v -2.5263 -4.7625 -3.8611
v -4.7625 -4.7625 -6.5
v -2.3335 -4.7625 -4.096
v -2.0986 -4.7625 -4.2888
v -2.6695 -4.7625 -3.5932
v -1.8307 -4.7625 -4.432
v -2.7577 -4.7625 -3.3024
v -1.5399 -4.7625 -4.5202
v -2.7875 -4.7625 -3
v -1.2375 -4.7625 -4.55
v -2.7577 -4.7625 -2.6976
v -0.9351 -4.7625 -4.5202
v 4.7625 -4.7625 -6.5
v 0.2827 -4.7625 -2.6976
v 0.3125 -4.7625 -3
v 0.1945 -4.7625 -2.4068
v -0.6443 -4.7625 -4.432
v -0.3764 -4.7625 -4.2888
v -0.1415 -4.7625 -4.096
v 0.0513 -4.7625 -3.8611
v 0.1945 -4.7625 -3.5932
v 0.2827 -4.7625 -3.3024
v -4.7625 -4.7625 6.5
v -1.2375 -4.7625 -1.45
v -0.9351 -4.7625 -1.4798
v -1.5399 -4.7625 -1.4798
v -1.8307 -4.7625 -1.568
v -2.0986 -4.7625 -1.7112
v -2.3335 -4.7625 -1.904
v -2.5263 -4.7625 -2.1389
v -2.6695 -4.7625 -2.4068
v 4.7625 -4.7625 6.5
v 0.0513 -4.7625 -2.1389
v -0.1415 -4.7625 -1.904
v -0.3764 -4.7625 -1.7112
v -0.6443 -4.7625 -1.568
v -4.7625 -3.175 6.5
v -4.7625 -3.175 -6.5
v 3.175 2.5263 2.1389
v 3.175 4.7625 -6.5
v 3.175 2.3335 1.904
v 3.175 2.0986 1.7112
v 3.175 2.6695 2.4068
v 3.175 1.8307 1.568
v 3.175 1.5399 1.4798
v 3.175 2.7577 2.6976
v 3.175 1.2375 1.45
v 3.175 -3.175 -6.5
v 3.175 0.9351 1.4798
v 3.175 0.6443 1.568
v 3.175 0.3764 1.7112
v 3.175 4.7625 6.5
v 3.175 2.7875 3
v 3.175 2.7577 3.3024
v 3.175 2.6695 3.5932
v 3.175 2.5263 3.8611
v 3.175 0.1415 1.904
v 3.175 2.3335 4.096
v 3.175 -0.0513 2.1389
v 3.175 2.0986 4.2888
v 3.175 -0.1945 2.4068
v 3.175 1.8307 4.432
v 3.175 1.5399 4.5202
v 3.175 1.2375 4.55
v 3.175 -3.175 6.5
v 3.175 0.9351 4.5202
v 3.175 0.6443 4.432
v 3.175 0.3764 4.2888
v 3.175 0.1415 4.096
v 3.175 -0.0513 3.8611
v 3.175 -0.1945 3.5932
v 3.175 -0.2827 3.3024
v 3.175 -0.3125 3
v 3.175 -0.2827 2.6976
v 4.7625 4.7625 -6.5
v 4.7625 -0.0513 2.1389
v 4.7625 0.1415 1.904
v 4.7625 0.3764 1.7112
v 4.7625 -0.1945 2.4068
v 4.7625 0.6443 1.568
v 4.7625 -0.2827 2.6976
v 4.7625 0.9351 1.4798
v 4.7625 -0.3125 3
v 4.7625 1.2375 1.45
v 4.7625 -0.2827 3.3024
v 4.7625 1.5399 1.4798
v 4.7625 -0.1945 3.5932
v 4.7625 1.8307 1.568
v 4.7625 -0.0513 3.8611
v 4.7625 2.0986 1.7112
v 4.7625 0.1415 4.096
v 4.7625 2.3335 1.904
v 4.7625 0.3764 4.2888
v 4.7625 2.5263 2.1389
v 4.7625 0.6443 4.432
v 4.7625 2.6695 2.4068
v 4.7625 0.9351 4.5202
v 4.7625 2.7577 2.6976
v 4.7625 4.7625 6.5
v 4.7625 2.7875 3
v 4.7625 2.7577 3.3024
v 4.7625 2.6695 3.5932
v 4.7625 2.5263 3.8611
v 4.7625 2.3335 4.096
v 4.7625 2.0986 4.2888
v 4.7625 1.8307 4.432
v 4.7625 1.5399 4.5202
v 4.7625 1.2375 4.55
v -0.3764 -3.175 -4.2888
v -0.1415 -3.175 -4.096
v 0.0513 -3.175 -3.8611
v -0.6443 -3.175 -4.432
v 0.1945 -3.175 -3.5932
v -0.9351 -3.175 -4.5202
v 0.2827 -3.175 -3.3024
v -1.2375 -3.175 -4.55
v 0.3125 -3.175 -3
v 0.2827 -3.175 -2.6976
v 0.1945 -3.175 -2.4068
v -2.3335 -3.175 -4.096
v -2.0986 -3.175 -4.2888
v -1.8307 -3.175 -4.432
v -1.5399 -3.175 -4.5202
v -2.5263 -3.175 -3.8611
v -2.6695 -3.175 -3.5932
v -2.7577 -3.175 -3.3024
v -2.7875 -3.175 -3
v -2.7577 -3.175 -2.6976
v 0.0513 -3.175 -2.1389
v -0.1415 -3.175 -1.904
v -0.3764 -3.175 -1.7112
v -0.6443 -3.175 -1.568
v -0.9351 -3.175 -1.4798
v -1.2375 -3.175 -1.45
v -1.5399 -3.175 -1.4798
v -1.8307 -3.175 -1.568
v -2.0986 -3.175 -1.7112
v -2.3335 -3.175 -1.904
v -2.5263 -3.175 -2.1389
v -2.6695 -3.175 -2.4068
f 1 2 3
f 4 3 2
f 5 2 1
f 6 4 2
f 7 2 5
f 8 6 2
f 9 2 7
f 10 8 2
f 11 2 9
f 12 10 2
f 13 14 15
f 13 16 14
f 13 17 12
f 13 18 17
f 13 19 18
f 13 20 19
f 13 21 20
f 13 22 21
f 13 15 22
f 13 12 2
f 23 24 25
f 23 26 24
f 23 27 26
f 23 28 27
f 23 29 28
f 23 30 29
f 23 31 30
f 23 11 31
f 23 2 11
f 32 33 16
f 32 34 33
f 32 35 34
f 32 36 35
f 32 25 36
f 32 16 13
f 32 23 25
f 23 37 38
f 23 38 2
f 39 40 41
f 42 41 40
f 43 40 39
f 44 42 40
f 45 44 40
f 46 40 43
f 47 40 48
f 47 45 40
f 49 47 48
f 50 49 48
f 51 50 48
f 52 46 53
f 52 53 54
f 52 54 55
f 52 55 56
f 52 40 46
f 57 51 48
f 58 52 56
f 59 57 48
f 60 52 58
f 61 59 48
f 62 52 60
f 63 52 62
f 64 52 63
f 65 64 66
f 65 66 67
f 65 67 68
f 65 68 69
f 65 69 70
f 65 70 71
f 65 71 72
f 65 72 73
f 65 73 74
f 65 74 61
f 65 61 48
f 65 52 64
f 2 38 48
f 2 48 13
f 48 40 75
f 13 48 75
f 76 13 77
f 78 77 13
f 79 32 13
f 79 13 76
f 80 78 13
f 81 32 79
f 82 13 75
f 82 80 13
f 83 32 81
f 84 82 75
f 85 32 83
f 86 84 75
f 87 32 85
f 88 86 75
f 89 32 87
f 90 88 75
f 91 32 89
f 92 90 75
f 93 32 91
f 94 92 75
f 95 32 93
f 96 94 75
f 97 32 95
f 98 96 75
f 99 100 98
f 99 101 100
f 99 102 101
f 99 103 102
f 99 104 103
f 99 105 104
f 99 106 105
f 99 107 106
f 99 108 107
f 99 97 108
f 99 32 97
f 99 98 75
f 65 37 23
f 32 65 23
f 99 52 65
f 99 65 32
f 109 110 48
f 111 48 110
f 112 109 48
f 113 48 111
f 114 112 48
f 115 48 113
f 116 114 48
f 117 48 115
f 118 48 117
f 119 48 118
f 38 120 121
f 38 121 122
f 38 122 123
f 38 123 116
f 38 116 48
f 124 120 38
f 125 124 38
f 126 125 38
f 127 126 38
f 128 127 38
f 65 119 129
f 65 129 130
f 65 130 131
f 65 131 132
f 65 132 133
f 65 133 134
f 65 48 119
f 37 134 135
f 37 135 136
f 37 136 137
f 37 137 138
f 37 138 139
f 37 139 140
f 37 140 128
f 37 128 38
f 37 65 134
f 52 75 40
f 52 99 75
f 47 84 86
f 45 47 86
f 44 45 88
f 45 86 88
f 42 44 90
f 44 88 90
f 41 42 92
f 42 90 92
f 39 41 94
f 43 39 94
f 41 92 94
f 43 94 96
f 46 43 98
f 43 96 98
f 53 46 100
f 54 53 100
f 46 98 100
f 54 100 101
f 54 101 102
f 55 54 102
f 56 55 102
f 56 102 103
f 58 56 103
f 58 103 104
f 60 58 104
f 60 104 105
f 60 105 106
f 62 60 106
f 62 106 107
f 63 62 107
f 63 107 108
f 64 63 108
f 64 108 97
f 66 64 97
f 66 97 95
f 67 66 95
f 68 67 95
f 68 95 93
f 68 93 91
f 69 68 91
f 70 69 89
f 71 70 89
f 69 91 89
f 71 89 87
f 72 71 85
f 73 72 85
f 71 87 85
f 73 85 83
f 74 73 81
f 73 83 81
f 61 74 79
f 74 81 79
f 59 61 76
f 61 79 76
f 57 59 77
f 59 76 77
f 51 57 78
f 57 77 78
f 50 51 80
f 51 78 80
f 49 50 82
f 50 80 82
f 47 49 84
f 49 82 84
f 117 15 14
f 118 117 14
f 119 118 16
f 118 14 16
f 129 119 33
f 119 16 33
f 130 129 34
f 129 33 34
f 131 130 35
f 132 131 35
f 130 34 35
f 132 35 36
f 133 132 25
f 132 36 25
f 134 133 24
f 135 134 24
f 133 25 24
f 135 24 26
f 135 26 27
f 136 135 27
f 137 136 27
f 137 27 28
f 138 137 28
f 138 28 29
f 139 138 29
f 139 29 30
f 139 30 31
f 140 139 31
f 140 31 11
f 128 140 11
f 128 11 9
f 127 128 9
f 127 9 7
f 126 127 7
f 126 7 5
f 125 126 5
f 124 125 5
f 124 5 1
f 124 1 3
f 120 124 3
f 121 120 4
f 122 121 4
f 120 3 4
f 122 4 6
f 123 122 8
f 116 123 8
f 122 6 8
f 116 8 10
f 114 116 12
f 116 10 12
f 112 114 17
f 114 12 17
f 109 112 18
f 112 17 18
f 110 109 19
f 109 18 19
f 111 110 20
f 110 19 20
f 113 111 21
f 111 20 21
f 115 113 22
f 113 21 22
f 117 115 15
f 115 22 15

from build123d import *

# Parameters (mm, degrees)
BOSS_EXTRUDE1_DEPTH = 6.5
SKETCH4_R           = 1.55
CUT_EXTRUDE1_DEPTH  = 10
SKETCH5_R           = 1.55
CUT_EXTRUDE2_DEPTH  = 10


with BuildPart() as part:
    # Sketch3 → Boss-Extrude1 (new body, symmetric)
    with BuildSketch(Plane.XY):
        Polygon((3.175, -3.175), (-4.7625, -3.175), (-4.7625, -4.7625), (4.7625, -4.7625), (4.7625, 4.7625), (3.175, 4.7625), align=None)
    extrude(amount=BOSS_EXTRUDE1_DEPTH, both=True)

    # Sketch4 → Cut-Extrude1 (cut)
    with BuildSketch(Plane(origin=(4.7625, 0, 0), x_dir=(0, 0, -1), z_dir=(1, 0, 0))):
        with Locations((-3, 1.2375)):
            Circle(SKETCH4_R)
    extrude(amount=-CUT_EXTRUDE1_DEPTH, mode=Mode.SUBTRACT)

    # Sketch5 → Cut-Extrude2 (cut)
    with BuildSketch(Plane.XZ.offset(4.7625)):
        with Locations((-1.2375, -3)):
            Circle(SKETCH5_R)
    extrude(amount=-CUT_EXTRUDE2_DEPTH, mode=Mode.SUBTRACT)


solid = part.part
